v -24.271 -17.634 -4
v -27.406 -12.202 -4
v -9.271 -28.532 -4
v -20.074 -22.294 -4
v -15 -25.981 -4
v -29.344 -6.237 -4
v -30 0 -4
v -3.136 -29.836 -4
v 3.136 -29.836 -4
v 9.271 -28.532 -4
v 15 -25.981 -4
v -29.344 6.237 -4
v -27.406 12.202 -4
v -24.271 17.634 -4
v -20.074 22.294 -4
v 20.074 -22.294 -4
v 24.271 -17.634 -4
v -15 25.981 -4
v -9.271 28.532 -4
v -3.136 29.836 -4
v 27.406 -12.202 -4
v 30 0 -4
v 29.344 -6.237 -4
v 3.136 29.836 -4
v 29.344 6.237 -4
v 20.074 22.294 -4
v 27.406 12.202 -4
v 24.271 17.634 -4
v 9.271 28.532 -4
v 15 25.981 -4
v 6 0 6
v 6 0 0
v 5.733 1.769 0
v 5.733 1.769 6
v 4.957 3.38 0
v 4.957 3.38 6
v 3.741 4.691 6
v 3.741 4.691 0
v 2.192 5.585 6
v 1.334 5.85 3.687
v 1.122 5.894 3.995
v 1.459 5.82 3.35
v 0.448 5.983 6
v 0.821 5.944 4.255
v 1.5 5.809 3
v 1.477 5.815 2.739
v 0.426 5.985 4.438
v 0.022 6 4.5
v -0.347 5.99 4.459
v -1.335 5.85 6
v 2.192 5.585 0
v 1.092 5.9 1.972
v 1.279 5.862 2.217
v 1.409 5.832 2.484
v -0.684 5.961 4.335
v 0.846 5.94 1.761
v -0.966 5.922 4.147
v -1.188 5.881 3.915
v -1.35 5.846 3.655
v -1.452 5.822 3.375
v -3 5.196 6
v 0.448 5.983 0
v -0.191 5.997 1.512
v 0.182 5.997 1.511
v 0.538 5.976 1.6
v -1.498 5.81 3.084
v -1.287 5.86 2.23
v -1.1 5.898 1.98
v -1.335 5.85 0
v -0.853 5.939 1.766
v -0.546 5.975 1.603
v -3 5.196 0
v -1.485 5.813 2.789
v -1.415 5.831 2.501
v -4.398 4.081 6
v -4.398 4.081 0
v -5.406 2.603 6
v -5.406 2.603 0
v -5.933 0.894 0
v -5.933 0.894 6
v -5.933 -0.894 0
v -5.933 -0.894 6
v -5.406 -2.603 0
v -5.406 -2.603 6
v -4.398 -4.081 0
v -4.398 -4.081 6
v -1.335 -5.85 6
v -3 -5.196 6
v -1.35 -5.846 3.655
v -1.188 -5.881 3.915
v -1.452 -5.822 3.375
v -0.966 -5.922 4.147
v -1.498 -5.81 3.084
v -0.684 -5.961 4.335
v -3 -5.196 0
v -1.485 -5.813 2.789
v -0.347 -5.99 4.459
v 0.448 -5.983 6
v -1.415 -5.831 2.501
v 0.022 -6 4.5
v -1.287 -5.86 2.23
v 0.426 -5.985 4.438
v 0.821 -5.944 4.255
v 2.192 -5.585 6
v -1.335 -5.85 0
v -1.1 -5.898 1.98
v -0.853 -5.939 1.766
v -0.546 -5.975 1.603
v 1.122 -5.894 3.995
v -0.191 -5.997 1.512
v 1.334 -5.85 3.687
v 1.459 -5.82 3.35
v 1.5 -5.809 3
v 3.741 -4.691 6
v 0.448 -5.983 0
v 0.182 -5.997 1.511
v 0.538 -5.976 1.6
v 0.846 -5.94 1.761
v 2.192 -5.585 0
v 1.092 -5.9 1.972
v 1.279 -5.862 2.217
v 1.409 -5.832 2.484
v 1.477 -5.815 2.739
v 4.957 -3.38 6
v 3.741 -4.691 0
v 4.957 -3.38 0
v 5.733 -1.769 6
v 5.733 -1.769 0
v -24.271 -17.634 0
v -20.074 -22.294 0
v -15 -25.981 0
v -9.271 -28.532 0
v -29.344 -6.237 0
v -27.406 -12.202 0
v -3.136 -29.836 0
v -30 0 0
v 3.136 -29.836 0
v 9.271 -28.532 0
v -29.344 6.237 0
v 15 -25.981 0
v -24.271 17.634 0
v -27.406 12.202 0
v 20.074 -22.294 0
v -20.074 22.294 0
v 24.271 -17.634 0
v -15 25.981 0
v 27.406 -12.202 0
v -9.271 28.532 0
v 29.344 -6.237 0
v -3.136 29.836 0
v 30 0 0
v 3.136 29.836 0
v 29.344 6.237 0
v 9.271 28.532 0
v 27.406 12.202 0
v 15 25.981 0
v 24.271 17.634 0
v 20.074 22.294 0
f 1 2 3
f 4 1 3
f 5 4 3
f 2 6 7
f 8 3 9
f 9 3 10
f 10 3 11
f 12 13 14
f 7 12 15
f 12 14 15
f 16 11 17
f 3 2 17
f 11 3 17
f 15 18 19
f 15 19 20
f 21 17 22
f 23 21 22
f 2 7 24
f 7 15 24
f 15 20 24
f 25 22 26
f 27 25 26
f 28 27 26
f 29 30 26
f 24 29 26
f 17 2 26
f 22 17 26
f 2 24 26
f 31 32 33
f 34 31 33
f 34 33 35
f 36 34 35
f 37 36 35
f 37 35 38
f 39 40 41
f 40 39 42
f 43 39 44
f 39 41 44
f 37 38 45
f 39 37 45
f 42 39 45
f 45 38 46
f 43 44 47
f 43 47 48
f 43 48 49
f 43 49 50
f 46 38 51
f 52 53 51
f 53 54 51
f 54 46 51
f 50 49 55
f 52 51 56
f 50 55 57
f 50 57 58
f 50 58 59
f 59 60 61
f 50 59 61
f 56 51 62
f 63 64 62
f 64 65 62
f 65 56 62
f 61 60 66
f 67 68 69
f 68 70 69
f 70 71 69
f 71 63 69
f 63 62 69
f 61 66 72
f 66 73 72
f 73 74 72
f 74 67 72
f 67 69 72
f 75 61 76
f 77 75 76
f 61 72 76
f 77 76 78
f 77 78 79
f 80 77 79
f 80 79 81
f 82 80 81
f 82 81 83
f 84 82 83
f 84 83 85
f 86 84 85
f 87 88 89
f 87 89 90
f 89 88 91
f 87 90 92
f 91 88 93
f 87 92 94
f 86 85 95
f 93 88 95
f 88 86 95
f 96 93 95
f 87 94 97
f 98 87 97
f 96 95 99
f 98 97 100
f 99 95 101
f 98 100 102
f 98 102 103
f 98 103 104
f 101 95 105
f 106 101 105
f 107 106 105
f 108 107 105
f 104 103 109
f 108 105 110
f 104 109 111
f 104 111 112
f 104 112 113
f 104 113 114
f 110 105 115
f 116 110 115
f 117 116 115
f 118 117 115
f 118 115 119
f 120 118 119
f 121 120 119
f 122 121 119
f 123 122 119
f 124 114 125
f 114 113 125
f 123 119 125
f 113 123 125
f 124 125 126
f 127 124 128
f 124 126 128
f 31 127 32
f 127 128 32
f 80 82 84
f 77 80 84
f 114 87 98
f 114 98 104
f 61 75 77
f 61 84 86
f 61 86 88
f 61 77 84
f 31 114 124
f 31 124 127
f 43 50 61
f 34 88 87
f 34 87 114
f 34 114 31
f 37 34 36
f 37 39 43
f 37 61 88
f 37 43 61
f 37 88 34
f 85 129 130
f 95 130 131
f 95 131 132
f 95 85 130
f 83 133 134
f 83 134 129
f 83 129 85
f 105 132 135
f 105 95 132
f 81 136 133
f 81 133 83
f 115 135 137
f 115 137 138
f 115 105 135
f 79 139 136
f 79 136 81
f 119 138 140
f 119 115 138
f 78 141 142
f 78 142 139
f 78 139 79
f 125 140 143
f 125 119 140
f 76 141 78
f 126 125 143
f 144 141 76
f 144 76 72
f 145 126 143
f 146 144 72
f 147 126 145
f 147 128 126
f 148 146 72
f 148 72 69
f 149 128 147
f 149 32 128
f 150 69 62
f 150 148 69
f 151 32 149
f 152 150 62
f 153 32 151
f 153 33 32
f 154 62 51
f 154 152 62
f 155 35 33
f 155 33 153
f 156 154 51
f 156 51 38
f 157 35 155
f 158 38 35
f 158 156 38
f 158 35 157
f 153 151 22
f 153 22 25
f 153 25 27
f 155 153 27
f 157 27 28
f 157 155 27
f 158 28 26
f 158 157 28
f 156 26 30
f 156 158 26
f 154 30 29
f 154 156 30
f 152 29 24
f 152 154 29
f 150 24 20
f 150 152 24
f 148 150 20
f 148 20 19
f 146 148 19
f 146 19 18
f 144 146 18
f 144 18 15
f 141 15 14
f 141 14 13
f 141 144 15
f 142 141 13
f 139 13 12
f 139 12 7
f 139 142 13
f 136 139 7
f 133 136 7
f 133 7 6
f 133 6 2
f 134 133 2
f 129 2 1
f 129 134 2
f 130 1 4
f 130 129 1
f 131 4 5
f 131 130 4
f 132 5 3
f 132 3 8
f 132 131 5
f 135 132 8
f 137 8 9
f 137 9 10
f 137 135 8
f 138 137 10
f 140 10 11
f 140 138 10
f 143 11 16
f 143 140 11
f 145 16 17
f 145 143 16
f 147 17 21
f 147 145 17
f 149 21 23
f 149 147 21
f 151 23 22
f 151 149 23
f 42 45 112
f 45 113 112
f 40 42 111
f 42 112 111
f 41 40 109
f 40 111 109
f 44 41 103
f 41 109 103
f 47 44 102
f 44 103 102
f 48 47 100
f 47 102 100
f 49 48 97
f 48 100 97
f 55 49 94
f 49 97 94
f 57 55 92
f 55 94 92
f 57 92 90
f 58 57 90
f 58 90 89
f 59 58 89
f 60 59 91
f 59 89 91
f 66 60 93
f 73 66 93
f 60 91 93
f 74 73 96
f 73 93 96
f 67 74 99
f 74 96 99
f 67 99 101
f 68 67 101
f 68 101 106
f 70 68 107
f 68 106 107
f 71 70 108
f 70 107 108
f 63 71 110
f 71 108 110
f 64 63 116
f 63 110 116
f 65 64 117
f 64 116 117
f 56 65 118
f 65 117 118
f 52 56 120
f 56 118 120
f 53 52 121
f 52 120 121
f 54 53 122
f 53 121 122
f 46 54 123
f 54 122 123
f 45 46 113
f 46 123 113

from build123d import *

# Parameters (mm, degrees)
F0_R     = 30
F0_R_2   = 6
F1_DEPTH = 4
F2_DEPTH = 6
F3_R     = 1.5
F4_DEPTH = 12.5


with BuildPart() as f1:
    # F0 (on Top) → F1 (new body)
    with BuildSketch(Plane.XY):
        Circle(F0_R)
        Circle(F0_R_2, mode=Mode.SUBTRACT)
        Circle(F0_R_2)
    extrude(amount=-F1_DEPTH)

    # F0 (on Top) → F2 (join)
    with BuildSketch(Plane.XY):
        Circle(F0_R_2)
    extrude(amount=F2_DEPTH)

    # F3 (on Front) → F4 (cut, symmetric)
    with BuildSketch(Plane.XZ):
        with Locations((0, 3)):
            Circle(F3_R)
    extrude(amount=F4_DEPTH, both=True, mode=Mode.SUBTRACT)


solid = f1.part
